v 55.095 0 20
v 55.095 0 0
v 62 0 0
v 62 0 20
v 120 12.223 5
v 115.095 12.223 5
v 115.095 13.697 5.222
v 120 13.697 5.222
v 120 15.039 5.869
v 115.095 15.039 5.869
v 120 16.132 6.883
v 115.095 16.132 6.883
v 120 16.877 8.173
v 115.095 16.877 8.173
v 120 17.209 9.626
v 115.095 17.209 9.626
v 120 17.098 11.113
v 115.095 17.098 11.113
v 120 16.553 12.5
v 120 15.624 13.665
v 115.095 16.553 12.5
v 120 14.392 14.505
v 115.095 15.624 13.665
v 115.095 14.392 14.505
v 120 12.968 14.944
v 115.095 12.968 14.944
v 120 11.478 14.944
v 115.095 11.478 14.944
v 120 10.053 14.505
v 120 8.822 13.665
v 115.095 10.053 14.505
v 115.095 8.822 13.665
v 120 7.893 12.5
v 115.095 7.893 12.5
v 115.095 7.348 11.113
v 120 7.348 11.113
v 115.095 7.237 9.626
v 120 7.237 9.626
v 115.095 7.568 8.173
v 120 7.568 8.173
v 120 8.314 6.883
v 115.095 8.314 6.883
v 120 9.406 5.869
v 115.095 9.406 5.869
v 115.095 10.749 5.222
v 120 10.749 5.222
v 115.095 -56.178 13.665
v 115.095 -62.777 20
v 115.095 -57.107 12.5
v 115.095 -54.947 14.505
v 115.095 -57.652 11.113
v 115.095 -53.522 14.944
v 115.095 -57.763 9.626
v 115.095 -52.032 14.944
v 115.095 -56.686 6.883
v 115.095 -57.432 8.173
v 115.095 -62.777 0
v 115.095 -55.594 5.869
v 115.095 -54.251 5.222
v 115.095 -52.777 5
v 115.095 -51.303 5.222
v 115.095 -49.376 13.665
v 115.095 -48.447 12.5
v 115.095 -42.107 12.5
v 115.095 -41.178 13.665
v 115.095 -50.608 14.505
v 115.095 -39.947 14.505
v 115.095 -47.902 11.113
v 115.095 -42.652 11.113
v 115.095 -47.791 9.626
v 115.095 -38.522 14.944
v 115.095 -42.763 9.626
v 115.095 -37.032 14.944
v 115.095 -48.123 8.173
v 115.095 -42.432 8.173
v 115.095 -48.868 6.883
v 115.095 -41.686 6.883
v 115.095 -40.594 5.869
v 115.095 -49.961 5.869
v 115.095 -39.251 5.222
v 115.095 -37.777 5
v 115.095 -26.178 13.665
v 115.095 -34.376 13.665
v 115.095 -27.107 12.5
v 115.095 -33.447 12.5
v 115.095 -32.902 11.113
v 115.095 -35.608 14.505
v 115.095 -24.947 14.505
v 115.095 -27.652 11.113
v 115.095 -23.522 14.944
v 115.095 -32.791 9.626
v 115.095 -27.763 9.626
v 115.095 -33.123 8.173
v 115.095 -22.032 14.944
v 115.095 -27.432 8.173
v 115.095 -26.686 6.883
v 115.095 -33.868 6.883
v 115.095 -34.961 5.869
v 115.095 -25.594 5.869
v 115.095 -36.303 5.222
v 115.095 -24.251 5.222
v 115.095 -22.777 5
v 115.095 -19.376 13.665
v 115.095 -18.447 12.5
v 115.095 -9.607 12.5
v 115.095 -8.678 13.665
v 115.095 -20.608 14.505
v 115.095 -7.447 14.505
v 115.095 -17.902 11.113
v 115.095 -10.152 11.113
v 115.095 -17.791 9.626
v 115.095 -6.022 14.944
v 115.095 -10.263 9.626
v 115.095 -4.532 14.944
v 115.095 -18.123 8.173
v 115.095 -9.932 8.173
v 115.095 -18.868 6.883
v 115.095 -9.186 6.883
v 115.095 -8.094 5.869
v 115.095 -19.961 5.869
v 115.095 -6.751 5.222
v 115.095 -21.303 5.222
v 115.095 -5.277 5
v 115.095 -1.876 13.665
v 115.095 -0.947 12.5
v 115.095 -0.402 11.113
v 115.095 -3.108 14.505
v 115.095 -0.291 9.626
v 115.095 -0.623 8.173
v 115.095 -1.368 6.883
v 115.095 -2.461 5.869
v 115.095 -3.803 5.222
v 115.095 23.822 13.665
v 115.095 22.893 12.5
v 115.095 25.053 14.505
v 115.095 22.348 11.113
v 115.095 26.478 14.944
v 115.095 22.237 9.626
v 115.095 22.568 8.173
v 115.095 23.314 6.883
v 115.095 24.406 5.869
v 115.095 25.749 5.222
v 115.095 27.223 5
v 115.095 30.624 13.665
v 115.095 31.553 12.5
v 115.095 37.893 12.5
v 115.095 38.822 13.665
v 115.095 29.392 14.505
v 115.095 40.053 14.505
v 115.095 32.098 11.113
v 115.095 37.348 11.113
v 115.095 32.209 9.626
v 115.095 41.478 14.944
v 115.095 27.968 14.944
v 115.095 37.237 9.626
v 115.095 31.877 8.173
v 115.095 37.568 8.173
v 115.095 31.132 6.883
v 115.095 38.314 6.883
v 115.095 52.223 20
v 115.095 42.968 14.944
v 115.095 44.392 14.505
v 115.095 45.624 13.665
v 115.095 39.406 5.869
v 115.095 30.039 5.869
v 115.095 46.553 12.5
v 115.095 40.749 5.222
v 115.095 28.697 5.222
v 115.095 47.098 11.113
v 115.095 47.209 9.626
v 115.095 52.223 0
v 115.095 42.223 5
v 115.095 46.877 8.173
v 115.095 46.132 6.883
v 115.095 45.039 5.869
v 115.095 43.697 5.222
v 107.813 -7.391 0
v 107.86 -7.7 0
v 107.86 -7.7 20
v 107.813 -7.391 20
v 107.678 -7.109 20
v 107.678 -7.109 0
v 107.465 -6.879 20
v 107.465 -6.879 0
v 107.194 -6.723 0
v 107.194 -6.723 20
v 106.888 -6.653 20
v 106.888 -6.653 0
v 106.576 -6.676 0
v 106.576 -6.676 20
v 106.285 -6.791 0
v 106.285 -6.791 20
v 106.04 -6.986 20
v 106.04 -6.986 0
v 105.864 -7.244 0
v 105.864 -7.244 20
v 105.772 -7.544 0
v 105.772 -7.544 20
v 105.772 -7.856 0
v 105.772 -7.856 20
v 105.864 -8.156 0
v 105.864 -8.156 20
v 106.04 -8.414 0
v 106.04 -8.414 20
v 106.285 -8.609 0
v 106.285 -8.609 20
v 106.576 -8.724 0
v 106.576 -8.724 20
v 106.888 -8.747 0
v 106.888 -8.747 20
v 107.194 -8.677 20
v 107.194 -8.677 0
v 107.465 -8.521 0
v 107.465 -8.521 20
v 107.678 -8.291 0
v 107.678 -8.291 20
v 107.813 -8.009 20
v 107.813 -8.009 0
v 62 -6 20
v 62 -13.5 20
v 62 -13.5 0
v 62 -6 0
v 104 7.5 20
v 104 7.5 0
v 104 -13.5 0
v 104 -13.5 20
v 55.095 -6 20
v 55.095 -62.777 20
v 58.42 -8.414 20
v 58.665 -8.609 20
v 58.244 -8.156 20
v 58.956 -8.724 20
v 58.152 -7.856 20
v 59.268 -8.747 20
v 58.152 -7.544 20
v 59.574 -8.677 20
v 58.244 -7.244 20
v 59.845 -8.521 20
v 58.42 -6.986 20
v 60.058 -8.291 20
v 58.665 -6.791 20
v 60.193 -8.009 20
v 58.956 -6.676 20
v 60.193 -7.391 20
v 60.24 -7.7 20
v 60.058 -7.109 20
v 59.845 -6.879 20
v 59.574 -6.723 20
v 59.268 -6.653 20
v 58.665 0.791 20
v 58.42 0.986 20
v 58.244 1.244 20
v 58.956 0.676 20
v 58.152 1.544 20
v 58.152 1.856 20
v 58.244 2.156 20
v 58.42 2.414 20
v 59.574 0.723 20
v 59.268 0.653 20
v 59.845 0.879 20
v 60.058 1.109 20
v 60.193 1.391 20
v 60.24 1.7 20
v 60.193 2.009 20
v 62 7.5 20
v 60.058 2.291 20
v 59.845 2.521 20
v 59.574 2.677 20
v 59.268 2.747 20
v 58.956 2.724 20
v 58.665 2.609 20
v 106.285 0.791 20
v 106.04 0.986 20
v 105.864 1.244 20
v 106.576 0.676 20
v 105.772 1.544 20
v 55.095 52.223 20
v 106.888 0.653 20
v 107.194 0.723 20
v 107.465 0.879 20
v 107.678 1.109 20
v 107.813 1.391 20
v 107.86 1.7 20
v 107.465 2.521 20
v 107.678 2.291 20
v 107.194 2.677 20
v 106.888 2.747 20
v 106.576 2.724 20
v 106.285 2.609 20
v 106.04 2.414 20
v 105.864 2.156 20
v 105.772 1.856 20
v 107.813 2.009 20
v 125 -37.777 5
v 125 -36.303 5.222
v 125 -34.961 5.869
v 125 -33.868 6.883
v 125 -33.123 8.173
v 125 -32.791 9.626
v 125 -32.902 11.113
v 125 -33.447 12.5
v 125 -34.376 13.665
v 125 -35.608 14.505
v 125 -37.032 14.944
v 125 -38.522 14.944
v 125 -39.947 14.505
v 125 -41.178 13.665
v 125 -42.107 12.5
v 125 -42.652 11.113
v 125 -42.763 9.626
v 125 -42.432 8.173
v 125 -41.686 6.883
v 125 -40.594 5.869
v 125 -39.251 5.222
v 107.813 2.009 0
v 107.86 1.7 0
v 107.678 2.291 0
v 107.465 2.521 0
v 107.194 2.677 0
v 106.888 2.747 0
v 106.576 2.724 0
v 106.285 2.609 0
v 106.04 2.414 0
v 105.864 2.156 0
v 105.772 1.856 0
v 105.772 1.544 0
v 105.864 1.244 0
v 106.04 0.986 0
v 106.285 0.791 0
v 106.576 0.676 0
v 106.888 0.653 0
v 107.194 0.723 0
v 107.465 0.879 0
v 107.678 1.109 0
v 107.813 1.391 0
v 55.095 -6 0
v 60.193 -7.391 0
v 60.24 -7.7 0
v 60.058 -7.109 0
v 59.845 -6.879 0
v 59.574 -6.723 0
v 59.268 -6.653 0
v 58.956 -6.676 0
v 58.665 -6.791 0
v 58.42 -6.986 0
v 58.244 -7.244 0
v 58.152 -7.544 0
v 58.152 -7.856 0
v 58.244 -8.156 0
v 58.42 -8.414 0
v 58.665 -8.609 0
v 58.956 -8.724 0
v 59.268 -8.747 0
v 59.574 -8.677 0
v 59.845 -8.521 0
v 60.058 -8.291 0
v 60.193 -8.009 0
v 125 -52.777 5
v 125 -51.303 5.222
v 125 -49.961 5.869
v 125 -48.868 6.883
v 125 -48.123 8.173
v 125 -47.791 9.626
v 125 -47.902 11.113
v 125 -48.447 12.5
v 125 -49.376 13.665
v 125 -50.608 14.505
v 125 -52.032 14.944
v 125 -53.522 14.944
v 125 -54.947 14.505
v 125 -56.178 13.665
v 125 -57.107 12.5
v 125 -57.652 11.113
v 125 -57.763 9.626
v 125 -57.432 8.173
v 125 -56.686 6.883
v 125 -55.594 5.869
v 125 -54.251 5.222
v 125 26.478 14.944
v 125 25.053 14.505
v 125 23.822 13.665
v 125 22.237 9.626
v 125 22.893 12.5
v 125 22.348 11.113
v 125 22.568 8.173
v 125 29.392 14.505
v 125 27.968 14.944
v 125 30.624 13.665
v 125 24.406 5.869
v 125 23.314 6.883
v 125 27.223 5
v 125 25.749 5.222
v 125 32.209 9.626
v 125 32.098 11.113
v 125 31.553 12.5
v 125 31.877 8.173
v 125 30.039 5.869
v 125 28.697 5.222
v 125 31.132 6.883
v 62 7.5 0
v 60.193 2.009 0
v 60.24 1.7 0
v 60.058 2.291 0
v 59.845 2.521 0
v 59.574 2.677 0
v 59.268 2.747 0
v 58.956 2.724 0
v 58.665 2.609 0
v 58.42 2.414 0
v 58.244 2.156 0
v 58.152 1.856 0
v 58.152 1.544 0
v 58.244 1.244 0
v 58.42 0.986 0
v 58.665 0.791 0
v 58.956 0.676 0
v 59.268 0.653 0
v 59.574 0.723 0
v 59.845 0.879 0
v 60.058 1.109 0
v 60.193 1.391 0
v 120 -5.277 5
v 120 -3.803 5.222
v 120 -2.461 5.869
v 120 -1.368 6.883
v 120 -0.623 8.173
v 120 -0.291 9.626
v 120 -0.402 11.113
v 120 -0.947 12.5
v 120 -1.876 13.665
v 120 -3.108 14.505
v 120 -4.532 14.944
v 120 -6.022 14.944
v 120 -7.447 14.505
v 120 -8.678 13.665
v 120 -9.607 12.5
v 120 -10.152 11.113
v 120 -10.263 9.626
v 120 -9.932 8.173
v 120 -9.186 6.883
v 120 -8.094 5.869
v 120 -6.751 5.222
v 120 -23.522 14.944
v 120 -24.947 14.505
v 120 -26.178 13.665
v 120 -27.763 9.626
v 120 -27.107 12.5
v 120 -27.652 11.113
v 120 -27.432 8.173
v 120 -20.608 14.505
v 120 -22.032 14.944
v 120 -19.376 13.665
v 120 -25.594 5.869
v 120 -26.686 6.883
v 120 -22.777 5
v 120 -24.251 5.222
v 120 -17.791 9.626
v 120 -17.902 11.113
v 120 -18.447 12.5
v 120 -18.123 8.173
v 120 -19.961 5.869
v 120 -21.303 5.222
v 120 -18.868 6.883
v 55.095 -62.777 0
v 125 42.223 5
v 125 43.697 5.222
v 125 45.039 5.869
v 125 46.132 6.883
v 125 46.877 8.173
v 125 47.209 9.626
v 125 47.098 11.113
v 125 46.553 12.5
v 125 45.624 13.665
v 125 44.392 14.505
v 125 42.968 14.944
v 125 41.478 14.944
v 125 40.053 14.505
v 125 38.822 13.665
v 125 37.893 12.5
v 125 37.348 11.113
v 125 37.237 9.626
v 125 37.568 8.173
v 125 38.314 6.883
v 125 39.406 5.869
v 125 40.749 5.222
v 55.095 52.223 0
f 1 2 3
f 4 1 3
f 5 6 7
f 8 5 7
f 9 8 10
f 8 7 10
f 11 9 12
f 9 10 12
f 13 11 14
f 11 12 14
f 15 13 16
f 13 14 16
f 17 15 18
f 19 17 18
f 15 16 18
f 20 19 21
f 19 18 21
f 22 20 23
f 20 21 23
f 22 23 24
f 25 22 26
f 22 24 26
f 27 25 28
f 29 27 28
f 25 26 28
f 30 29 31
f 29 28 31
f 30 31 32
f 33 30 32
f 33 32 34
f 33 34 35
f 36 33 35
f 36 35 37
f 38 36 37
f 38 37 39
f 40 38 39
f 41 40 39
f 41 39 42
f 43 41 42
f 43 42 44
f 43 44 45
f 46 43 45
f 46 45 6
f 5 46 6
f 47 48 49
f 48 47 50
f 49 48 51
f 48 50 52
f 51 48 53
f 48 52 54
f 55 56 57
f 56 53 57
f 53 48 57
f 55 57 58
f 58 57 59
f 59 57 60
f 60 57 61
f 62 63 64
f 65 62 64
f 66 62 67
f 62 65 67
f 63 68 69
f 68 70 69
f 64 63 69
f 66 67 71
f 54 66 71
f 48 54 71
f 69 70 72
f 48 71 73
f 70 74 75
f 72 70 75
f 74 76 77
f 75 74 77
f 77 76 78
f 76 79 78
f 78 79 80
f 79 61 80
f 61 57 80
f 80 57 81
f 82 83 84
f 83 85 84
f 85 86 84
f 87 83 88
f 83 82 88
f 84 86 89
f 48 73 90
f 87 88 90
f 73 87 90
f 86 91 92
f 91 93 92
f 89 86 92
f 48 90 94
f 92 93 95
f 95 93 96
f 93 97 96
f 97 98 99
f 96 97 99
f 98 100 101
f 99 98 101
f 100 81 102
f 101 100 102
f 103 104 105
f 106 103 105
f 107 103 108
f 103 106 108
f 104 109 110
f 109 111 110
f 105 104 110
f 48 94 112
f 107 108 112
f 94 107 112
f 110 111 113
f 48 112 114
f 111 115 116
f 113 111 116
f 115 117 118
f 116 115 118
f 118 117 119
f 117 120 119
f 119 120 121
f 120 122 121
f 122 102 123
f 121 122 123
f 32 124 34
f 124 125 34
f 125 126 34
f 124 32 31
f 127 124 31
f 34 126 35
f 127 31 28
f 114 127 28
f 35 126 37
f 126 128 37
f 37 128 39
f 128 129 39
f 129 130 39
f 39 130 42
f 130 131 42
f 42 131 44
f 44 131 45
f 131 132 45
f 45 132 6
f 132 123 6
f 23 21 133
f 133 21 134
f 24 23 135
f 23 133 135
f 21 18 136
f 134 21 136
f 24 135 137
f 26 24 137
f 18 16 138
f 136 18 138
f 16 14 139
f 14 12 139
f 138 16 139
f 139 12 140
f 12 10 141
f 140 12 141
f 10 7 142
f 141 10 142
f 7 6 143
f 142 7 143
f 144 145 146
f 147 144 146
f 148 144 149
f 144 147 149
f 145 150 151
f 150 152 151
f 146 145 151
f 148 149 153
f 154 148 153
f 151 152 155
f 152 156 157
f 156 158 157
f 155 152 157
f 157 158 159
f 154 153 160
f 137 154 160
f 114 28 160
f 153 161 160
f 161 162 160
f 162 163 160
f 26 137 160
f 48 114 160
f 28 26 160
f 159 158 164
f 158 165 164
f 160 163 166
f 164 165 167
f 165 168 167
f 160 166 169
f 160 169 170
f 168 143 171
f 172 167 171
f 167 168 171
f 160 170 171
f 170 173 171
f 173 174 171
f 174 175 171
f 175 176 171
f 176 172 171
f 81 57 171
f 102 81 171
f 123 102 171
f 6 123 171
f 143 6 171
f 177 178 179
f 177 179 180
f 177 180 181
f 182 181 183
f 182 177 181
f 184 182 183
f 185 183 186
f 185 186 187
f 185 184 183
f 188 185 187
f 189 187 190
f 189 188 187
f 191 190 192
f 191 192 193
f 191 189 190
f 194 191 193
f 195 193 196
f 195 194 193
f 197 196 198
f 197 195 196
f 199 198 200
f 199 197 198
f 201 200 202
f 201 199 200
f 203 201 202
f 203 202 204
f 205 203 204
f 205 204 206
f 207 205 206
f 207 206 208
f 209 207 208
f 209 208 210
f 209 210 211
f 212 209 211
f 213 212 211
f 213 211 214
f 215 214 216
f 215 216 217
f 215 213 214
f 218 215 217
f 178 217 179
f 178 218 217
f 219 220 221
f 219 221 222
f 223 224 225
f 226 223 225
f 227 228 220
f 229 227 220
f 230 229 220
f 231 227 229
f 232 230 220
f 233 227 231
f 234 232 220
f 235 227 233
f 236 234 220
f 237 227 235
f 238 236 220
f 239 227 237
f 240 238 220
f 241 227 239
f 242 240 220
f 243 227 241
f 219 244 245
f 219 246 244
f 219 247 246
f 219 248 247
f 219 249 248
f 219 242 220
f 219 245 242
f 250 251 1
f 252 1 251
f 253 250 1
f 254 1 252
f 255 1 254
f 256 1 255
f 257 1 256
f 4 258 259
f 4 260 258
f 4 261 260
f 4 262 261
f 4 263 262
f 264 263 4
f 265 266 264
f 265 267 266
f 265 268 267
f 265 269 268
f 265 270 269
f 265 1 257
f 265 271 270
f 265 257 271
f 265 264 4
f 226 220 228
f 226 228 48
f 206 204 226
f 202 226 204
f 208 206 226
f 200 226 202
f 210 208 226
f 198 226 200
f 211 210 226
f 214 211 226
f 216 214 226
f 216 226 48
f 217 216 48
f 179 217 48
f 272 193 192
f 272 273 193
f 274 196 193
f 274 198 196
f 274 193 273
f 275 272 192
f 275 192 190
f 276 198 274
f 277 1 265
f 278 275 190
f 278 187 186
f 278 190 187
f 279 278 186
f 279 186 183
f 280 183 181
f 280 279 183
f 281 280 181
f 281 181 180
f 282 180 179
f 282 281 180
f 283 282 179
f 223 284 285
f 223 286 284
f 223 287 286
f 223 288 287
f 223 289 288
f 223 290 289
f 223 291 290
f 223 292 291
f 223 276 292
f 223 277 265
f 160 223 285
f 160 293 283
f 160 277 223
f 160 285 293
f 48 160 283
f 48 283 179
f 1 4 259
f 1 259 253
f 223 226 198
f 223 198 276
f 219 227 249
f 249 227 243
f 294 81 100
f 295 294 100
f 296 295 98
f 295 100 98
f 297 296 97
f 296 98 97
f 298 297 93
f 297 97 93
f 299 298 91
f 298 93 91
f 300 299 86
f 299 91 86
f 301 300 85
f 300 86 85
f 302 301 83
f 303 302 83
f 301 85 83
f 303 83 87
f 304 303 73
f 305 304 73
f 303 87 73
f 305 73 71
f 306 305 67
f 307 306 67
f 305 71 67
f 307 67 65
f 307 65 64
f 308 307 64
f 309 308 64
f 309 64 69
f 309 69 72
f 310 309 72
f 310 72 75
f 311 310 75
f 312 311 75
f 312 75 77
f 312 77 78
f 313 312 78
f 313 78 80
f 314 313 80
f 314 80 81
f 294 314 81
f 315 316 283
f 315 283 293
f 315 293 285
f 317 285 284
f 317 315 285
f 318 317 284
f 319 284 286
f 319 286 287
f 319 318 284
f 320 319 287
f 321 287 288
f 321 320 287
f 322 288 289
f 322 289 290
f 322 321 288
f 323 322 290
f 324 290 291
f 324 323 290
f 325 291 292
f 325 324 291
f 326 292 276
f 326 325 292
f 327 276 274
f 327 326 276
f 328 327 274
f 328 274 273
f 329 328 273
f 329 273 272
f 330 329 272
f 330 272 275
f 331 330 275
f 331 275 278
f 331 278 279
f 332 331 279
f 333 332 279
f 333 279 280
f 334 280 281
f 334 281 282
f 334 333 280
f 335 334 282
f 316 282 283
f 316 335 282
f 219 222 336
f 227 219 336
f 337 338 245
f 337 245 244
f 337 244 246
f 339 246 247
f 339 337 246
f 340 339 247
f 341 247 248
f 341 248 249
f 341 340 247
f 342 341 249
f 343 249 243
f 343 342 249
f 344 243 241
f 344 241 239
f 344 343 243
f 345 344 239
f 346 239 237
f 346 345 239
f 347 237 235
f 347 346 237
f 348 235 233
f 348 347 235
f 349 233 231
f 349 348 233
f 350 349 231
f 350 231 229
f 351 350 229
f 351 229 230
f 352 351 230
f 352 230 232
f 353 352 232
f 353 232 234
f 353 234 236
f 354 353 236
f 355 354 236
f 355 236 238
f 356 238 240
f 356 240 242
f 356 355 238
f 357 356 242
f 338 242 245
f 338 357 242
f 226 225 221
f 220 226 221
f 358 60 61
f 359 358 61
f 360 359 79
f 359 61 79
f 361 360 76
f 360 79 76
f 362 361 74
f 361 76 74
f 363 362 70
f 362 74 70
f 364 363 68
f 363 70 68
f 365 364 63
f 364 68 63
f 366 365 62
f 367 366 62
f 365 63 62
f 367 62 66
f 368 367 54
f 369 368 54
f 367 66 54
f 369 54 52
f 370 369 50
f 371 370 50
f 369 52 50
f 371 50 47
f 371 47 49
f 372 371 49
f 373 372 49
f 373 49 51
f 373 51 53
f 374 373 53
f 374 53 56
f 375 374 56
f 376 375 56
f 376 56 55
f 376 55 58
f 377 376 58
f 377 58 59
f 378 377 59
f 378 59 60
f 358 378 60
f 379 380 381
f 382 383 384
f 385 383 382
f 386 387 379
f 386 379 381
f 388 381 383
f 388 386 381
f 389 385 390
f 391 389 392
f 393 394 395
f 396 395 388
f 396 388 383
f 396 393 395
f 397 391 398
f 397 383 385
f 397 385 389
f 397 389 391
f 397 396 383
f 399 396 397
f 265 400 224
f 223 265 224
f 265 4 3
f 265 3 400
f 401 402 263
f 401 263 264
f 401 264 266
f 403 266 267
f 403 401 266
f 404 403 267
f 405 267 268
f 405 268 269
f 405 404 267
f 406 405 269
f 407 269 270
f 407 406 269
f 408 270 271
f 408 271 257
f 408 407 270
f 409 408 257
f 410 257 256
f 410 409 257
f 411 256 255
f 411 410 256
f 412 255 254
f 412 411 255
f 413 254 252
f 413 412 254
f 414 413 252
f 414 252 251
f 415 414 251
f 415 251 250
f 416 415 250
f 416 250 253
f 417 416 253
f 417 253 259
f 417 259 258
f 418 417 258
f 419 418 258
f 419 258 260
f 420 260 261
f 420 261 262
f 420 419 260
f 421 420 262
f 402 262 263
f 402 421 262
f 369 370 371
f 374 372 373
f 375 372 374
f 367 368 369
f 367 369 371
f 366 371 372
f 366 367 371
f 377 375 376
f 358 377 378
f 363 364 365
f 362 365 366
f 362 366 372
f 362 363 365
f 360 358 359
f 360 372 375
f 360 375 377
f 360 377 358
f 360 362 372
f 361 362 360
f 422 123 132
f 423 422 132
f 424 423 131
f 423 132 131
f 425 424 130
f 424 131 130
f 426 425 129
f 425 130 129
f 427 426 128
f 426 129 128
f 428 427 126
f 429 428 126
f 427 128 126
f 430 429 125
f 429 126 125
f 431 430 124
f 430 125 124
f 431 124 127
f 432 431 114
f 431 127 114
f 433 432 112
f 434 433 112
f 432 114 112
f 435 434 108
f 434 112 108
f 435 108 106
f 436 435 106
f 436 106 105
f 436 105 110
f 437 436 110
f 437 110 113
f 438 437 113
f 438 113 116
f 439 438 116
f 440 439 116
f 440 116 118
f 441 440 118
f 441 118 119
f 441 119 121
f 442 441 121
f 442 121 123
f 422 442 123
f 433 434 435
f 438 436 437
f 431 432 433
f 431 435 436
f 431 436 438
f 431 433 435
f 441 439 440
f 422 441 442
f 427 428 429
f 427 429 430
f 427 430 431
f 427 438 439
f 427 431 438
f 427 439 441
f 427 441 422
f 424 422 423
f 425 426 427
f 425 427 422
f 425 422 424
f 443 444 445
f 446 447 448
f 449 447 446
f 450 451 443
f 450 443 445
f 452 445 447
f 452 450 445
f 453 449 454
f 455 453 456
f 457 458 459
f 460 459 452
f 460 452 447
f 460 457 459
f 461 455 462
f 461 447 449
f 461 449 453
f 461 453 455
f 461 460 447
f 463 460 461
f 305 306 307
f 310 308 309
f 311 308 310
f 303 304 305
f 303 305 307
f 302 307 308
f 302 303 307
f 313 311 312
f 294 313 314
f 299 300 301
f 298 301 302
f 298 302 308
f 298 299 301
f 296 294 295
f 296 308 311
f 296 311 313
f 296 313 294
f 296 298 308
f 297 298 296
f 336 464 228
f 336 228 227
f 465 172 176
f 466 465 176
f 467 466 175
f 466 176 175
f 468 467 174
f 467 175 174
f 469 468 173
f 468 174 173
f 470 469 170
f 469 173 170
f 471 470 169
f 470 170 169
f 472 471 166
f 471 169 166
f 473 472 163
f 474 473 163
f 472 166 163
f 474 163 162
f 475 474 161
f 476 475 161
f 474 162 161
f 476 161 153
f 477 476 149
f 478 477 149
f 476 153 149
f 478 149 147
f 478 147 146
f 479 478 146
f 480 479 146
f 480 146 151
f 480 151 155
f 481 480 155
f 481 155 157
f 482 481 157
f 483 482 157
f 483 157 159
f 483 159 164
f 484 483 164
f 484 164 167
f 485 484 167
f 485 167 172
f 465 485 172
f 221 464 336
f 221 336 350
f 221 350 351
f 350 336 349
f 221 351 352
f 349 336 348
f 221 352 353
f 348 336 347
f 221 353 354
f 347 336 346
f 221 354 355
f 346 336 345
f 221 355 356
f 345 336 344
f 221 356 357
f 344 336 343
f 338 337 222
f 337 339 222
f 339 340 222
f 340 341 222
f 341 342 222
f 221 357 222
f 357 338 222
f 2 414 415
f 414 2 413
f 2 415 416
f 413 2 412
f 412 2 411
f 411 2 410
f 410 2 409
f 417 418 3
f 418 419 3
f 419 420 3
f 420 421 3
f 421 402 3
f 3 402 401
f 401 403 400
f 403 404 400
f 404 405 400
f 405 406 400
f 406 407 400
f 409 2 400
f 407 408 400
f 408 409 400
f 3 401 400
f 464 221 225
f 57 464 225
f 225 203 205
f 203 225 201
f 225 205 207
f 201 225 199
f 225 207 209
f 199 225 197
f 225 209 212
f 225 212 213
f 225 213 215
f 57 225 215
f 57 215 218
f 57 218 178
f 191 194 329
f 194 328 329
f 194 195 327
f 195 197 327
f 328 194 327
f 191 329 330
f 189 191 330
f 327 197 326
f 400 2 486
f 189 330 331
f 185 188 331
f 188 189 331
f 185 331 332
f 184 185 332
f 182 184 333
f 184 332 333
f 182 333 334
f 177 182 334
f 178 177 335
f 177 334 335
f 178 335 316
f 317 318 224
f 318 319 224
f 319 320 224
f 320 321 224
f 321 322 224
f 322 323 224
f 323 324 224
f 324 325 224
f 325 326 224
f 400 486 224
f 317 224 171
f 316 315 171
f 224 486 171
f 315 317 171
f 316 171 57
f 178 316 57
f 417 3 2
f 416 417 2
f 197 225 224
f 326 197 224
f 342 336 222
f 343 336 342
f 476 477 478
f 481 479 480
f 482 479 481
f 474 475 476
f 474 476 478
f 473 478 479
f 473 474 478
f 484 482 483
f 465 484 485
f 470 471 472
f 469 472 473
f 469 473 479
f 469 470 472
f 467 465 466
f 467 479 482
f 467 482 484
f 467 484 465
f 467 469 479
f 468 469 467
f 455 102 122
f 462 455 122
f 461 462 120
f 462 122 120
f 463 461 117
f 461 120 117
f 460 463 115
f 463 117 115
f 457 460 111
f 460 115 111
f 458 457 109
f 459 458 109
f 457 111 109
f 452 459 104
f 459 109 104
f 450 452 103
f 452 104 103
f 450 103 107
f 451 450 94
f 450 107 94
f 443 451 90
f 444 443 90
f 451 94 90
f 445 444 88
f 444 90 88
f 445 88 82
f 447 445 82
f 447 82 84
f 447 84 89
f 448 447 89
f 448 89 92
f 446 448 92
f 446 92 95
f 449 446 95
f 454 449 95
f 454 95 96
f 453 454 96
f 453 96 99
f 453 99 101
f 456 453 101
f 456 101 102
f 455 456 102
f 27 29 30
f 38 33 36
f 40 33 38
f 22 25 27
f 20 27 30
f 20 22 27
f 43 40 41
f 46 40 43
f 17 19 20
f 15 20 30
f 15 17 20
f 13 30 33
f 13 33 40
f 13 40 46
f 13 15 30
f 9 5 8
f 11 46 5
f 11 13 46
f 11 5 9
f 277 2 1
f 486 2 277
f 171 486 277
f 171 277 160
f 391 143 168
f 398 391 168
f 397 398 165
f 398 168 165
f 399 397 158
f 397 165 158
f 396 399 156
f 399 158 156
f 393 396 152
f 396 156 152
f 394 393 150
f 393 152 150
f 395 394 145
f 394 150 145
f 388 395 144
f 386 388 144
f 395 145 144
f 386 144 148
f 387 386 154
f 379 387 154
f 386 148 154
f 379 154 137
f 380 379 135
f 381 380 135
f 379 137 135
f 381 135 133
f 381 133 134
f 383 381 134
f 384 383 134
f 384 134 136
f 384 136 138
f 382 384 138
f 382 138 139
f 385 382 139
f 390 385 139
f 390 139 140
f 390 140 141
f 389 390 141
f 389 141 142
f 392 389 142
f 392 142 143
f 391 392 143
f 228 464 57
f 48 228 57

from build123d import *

# Parameters (mm, degrees)
SKETCH_5_W          = 60
SKETCH_5_H          = 115
EXTRUDE_2_DEPTH     = 20
SKETCH_1_R          = 1.05
CUT_EXTRUDE_4_DEPTH = 20
SKETCH_6_R          = 5
EXTRUDE_3_DEPTH     = 10
SKETCH_7_R          = 5
EXTRUDE_4_DEPTH     = 5


with BuildPart() as part:
    # 草圖5 → 填料-伸長2 (new body)
    with BuildSketch(Plane.XY):
        with Locations((85.095319229, -5.277137892)):
            Rectangle(SKETCH_5_W, SKETCH_5_H)
    extrude(amount=EXTRUDE_2_DEPTH)

    # 草圖1 → 除料-伸長4 (cut)
    with BuildSketch(Plane.XY):
        with Locations((59.19, 1.7)):
            Circle(SKETCH_1_R)
        with Locations((106.81, 1.7)):
            Circle(SKETCH_1_R)
        with Locations((106.81, -7.7)):
            Circle(SKETCH_1_R)
        with Locations((59.19, -7.7)):
            Circle(SKETCH_1_R)
        Polygon((55, -3), (55, 0), (62, 0), (62, 7.5), (104, 7.5), (104, -13.5), (62, -13.5), (62, -6), (55, -6), align=None)
    extrude(amount=CUT_EXTRUDE_4_DEPTH, mode=Mode.SUBTRACT)

    # 草圖6 → 填料-伸長3 (add)
    with BuildSketch(Plane(origin=(115, 0, 0), x_dir=(0, 0, -1), z_dir=(1, 0, 0))):
        with Locations((-10, 42.222862108)):
            Circle(SKETCH_6_R)
        with Locations((-10, 27.222862108)):
            Circle(SKETCH_6_R)
        with Locations((-10, -37.777137892)):
            Circle(SKETCH_6_R)
        with Locations((-10, -52.777137892)):
            Circle(SKETCH_6_R)
    extrude(amount=EXTRUDE_3_DEPTH)

    # 草圖7 → 填料-伸長4 (add)
    with BuildSketch(Plane(origin=(115, 0, 0), x_dir=(0, 0, -1), z_dir=(1, 0, 0))):
        with Locations((-10, 12.222862108)):
            Circle(SKETCH_7_R)
        with Locations((-10, -5.277137892)):
            Circle(SKETCH_7_R)
        with Locations((-10, -22.777137892)):
            Circle(SKETCH_7_R)
    extrude(amount=EXTRUDE_4_DEPTH)


solid = part.part
